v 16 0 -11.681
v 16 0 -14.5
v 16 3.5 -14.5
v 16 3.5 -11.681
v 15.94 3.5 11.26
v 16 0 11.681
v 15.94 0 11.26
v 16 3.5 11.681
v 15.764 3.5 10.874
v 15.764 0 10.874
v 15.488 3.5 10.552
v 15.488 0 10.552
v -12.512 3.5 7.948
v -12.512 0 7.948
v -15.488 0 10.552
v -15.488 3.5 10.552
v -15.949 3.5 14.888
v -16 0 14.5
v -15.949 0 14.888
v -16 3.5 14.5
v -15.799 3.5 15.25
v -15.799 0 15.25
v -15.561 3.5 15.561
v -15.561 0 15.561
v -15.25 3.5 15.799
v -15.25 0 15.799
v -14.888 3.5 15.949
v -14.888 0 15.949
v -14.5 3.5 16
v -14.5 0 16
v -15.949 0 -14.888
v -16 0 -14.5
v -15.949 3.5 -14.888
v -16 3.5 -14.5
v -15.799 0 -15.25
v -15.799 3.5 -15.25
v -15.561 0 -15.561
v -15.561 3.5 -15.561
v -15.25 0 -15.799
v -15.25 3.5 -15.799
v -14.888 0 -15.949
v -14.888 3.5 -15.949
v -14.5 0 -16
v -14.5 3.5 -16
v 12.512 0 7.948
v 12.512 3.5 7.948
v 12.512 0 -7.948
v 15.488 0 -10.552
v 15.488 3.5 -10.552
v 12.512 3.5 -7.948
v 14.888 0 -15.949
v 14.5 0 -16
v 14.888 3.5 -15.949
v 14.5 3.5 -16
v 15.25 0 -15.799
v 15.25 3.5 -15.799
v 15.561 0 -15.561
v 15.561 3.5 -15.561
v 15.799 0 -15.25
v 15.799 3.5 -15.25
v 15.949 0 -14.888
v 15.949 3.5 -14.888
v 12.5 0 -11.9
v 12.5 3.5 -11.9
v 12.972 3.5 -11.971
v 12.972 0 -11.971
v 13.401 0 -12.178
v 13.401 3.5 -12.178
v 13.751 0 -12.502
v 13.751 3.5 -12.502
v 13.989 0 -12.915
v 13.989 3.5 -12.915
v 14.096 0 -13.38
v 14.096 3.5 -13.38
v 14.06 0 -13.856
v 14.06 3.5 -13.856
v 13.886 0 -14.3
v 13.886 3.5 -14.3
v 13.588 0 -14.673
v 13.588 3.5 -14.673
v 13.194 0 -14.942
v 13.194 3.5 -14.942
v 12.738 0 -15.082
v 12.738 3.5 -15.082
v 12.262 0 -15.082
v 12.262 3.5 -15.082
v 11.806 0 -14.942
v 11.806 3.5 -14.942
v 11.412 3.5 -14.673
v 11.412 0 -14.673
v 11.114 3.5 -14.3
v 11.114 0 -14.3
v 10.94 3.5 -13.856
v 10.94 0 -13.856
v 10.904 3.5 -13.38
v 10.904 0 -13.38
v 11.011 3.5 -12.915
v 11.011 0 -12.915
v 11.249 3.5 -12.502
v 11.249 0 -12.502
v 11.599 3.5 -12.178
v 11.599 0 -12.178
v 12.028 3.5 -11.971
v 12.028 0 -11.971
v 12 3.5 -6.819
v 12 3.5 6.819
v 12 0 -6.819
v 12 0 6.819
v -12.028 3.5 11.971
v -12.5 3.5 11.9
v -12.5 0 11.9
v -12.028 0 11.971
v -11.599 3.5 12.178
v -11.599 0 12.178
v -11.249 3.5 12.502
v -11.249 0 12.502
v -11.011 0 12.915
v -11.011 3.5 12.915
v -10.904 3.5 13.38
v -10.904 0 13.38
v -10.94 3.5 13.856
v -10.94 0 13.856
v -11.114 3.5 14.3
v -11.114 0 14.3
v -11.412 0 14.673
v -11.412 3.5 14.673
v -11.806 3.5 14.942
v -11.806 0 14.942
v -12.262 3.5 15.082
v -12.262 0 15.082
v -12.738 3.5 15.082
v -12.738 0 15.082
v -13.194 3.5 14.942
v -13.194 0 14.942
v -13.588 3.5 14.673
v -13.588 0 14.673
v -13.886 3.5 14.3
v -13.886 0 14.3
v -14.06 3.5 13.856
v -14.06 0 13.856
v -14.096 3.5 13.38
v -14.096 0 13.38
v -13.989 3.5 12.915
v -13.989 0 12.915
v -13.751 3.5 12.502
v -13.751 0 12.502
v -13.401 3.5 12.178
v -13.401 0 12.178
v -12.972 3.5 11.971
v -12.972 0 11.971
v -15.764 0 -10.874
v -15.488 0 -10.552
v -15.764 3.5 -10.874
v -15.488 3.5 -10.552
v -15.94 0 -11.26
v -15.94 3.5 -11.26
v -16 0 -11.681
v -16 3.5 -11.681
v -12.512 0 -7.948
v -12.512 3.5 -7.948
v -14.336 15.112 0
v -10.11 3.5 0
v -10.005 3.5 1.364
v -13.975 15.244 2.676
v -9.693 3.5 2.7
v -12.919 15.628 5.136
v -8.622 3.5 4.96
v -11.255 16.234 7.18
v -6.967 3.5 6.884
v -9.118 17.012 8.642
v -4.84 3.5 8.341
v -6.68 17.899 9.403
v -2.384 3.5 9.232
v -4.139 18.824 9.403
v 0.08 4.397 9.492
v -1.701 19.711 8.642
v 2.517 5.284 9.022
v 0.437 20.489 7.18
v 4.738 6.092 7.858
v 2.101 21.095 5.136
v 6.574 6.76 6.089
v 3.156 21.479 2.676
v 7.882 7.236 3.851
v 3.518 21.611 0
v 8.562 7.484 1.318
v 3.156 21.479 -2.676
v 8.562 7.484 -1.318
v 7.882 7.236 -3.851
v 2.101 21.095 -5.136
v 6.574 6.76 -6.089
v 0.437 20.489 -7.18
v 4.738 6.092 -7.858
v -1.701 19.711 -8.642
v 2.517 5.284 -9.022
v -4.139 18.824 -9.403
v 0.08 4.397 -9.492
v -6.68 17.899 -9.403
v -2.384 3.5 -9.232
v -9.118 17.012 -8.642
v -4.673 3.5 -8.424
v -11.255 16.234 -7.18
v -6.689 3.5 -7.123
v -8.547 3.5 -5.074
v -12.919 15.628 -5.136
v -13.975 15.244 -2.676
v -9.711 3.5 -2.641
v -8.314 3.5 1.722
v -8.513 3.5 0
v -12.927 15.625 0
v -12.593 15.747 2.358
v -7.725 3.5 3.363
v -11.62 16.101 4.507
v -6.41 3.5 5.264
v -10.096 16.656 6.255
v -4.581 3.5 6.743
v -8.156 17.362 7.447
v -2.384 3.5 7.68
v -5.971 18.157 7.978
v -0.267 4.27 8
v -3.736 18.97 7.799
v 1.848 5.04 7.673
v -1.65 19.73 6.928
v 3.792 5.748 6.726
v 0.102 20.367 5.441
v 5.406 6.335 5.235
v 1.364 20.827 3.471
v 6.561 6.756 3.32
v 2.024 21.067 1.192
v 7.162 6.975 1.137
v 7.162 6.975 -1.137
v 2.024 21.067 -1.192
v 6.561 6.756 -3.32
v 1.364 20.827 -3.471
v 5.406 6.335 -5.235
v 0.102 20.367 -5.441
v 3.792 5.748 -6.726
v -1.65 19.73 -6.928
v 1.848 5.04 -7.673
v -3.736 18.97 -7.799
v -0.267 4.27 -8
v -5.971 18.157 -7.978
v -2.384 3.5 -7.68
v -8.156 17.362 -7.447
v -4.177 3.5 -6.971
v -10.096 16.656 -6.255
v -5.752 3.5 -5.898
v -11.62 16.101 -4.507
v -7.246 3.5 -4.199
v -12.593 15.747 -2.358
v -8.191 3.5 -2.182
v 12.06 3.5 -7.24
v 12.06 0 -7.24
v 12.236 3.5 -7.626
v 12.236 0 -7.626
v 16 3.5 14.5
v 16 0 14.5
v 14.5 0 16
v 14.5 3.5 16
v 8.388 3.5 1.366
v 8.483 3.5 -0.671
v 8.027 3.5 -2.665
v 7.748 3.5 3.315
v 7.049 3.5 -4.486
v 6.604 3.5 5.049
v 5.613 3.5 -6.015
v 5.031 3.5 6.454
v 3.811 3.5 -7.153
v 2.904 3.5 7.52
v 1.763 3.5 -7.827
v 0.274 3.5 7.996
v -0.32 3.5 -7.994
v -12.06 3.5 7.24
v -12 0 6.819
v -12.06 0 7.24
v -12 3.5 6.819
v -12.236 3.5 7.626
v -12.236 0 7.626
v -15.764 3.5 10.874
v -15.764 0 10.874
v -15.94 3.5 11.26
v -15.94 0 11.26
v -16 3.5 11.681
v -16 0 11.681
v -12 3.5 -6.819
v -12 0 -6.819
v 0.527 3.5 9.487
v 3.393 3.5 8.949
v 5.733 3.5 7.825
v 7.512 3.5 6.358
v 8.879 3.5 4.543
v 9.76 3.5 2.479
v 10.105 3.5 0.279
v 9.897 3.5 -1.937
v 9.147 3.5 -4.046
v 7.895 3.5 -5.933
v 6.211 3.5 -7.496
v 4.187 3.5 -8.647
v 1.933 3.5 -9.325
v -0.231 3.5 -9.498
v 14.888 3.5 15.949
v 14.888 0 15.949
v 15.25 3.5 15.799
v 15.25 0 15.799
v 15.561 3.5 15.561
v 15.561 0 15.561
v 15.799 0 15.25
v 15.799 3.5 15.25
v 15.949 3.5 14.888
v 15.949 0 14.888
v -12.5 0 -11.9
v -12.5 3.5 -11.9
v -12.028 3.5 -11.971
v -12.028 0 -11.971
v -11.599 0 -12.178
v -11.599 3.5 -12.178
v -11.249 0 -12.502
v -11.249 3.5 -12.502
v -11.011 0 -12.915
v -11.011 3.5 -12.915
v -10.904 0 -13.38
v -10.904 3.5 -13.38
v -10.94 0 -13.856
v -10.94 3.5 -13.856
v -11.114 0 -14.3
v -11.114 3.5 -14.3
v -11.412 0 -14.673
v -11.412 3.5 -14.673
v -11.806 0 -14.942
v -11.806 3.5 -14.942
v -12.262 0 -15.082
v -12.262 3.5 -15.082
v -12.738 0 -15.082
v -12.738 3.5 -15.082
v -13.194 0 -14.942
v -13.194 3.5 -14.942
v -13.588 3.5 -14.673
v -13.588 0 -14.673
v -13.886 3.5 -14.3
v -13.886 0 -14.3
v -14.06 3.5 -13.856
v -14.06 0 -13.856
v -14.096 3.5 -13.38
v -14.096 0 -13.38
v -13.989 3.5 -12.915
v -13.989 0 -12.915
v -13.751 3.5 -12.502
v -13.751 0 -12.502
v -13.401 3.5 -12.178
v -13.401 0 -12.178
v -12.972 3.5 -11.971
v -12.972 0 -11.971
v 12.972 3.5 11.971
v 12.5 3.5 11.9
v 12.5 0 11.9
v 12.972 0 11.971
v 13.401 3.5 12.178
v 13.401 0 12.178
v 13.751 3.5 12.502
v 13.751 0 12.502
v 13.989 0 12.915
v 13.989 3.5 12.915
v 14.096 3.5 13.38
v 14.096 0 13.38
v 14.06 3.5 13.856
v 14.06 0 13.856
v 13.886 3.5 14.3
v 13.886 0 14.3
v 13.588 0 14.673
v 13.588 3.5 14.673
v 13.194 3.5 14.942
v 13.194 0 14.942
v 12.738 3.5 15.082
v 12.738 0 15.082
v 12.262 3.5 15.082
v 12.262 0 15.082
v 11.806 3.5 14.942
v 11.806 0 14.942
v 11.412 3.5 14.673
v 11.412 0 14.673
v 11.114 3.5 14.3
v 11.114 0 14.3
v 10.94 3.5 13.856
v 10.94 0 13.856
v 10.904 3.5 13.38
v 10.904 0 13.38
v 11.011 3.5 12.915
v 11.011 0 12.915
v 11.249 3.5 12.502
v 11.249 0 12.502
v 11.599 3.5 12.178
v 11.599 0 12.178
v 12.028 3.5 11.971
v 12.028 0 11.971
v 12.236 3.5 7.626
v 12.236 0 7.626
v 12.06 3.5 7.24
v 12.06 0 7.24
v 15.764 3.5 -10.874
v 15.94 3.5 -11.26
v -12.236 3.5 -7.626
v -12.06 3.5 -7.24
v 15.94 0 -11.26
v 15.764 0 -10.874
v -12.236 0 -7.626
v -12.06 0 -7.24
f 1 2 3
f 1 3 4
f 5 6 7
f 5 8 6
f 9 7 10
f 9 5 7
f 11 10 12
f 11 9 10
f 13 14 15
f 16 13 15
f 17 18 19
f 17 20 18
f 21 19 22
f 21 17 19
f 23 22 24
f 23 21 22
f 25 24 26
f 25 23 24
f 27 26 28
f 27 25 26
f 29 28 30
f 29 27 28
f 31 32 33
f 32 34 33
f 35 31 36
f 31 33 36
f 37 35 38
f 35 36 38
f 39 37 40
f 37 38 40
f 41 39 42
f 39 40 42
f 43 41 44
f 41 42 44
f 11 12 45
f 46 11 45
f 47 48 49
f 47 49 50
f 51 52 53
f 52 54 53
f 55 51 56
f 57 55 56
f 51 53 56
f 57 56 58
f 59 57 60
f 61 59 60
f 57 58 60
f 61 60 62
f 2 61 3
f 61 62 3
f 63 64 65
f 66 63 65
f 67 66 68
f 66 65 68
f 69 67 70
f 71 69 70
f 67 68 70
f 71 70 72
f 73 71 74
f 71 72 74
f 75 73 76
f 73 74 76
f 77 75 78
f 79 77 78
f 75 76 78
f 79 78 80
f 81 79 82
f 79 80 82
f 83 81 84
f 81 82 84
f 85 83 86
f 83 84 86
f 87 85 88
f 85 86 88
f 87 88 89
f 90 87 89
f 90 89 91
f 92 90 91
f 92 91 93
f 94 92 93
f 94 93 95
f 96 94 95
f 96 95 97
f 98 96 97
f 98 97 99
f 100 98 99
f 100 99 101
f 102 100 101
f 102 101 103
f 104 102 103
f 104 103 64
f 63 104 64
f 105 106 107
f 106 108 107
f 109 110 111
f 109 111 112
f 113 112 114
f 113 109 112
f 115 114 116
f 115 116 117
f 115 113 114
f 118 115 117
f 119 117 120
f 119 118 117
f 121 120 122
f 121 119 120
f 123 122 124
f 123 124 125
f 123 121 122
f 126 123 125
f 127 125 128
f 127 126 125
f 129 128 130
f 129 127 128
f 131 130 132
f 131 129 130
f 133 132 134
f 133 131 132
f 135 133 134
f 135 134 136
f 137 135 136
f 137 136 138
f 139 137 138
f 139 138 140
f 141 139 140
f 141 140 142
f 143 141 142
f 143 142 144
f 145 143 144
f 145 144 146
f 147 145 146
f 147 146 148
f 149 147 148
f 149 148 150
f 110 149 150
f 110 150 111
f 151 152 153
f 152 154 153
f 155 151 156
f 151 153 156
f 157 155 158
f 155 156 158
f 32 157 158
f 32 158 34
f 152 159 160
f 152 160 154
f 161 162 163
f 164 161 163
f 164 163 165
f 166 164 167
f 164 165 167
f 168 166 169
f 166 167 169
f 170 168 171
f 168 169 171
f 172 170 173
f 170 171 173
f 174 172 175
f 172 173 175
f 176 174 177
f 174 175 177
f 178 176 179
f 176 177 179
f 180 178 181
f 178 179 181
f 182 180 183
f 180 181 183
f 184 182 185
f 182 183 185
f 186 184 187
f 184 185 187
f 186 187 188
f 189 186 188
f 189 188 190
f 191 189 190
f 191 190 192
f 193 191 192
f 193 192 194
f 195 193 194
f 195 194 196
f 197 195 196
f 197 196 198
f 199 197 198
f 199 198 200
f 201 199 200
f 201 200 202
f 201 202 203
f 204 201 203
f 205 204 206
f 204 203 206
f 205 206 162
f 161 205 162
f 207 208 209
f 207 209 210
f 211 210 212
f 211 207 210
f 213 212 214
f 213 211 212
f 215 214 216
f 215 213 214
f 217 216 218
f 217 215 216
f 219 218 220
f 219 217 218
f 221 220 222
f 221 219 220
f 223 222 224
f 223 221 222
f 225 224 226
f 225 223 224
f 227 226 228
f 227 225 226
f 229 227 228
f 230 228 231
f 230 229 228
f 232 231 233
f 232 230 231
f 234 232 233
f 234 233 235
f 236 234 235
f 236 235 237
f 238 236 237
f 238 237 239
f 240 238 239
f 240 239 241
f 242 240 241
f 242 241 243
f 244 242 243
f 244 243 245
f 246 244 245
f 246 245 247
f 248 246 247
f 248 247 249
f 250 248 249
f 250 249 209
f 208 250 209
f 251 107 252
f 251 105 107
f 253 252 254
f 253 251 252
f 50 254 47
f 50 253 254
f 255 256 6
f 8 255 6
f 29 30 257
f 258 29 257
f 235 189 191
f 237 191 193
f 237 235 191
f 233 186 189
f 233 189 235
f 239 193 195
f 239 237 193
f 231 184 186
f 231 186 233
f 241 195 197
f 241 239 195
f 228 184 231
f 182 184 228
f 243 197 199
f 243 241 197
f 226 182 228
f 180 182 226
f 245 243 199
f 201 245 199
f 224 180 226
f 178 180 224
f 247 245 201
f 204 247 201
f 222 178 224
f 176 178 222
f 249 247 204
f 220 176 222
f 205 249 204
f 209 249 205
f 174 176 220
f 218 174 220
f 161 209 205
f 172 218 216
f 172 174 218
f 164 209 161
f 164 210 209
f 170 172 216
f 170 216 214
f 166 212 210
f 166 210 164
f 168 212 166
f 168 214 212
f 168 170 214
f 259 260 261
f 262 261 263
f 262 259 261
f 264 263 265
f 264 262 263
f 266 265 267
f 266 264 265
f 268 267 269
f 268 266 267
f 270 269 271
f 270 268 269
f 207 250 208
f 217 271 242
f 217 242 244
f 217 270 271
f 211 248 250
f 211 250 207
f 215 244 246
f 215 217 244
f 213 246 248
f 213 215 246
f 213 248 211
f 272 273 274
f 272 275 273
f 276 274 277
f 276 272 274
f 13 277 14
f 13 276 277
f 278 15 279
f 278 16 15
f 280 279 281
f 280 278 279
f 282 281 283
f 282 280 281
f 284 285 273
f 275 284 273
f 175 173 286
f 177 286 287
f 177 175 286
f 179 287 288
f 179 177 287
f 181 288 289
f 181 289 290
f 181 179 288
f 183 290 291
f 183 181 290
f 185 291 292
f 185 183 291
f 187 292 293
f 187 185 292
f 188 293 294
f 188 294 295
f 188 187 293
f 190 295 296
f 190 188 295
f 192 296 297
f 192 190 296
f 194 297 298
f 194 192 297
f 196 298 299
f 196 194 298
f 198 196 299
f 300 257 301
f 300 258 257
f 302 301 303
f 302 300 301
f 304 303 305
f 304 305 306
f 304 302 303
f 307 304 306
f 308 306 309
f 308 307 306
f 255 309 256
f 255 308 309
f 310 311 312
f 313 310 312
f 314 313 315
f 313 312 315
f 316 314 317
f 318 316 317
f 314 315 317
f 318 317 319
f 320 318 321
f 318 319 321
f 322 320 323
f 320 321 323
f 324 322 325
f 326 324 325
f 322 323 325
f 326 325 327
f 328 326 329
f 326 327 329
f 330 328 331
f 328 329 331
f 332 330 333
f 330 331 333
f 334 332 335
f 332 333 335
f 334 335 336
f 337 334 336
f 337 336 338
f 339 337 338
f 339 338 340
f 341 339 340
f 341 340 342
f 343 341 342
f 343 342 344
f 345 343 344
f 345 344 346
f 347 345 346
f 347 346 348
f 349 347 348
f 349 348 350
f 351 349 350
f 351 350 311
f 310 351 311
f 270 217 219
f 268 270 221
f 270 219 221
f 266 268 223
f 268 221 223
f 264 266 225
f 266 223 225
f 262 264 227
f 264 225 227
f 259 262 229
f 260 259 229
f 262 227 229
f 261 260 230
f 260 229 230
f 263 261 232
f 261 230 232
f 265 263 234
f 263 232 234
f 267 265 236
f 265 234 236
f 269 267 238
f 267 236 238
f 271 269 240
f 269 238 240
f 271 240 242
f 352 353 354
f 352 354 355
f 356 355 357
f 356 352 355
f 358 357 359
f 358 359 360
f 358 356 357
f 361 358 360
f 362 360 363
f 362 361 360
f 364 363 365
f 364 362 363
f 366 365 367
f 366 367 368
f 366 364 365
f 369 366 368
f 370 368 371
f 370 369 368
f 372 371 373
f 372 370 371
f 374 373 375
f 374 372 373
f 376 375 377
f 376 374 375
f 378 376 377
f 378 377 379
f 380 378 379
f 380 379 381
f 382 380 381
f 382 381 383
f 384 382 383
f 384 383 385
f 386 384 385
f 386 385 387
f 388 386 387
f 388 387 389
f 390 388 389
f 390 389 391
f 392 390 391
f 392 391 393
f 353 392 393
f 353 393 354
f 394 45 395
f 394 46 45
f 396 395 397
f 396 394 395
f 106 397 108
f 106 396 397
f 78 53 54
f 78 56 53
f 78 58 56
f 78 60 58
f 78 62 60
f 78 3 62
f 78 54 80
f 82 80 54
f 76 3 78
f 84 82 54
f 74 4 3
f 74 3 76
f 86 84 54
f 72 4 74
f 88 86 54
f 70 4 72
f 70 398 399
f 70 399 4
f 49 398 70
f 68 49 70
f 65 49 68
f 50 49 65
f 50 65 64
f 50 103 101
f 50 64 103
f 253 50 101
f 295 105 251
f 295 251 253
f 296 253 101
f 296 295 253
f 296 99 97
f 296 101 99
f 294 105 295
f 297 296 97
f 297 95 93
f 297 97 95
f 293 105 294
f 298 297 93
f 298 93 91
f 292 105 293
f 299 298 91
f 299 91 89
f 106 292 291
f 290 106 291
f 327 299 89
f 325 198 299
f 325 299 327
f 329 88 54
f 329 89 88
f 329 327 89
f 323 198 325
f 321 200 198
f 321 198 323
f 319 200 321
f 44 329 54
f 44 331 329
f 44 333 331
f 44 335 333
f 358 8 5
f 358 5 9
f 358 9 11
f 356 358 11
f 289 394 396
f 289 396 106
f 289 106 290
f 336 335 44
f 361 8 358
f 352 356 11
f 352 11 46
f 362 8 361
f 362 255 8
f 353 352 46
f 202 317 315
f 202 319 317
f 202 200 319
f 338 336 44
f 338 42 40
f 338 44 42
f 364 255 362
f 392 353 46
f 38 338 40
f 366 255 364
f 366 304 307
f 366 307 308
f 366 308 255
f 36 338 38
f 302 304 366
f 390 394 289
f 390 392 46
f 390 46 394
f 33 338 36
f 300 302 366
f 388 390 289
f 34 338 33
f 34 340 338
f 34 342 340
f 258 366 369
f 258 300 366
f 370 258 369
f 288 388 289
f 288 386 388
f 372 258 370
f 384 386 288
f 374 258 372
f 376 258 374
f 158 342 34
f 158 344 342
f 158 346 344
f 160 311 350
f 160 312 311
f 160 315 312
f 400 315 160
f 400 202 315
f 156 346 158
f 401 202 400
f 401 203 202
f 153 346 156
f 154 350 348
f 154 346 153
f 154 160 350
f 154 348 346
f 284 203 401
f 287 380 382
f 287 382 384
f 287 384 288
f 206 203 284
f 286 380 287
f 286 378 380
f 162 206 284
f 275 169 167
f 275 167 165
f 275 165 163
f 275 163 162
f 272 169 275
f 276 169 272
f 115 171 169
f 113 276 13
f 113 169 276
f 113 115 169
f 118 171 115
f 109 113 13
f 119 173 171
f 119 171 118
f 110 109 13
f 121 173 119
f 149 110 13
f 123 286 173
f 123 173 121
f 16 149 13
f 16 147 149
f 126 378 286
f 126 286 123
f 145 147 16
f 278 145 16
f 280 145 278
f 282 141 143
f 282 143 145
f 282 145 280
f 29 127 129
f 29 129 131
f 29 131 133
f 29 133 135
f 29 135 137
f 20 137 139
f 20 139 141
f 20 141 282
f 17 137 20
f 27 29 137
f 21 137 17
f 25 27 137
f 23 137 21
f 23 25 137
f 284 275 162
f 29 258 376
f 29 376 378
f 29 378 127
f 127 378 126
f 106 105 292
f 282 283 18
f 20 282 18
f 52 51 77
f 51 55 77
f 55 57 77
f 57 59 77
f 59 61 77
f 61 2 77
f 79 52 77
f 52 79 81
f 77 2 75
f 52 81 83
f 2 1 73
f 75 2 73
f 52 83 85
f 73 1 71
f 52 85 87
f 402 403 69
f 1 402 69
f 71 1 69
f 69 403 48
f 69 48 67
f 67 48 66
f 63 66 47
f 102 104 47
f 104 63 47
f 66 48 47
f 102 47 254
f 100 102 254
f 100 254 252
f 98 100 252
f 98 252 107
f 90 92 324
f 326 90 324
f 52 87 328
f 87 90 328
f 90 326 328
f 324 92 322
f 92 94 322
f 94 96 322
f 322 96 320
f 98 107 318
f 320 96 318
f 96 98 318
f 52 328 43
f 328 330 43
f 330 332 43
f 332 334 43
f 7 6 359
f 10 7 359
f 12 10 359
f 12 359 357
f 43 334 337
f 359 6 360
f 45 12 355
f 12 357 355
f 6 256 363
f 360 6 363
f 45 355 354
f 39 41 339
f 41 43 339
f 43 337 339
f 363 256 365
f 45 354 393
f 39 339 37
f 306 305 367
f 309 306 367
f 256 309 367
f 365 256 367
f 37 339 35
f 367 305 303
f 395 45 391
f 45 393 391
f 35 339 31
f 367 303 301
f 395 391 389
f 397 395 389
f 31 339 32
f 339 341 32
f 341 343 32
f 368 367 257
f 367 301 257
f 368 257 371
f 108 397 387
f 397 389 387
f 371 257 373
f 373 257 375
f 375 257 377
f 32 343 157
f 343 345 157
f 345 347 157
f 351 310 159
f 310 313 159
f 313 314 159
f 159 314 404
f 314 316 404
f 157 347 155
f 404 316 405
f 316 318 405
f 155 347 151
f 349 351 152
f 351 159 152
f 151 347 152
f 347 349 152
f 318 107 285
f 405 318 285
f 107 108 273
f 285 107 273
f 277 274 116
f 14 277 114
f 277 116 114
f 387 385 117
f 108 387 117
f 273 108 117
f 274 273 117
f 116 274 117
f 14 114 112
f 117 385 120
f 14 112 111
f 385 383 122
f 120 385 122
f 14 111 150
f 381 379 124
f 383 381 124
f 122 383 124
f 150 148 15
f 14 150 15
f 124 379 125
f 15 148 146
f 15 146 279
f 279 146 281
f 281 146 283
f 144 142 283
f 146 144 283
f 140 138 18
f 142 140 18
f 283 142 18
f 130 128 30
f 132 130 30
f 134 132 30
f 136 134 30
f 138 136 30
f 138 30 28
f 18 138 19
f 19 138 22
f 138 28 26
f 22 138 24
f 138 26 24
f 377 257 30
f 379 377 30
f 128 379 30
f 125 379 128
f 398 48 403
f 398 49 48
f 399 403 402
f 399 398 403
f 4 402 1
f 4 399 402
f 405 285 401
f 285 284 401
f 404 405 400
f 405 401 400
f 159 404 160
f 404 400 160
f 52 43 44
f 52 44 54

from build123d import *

# Parameters (mm, degrees)
BOSS_EXTRUDE1_DEPTH             = 3.5
CUT_EXTRUDE1_REACH              = 24.897
SKETCH2_R                       = 1.6
FILLET1_R                       = 1.5
FILLET1_OF_MIRROR1_R            = 1.5
SKETCH3_R                       = 9.5
SKETCH3_R_2                     = 8
BOSS_EXTRUDE3_DEPTH             = 15
BOSS_EXTRUDE3_DIRECTION_2_REACH = 25.953


with BuildPart() as part:
    # Sketch1 → Boss-Extrude1 (new body)
    with BuildSketch(Plane(origin=(0, 0, 0), x_dir=(1, 0, 0), z_dir=(0, 1, 0))):
        Polygon((-12, 0), (-12, 7.5), (-16, 11), (-16, 16), (16, 16), (16, 11), (12, 7.5), (12, 0), align=None)
    boss_extrude1 = extrude(amount=BOSS_EXTRUDE1_DEPTH)

    # Sketch2 → Cut-Extrude1 (cut, up to next)
    with BuildSketch(Plane(origin=(0, 3.5, 0), x_dir=(1, 0, 0), z_dir=(0, 1, 0)), mode=Mode.PRIVATE) as cut_extrude1_sk1:
        with Locations(Location((-12.5, 13.5, 0), (0, 0, 270))):
            Circle(SKETCH2_R)
    cut_extrude1_tool1 = extrude(cut_extrude1_sk1.sketch, amount=-CUT_EXTRUDE1_REACH, mode=Mode.PRIVATE) & part.part
    # Sketch2 → Cut-Extrude1 (cut, up to next)
    with BuildSketch(Plane(origin=(0, 3.5, 0), x_dir=(1, 0, 0), z_dir=(0, 1, 0)), mode=Mode.PRIVATE) as cut_extrude1_sk2:
        with Locations(Location((12.5, 13.5, 0), (0, 0, 270))):
            Circle(SKETCH2_R)
    cut_extrude1_tool2 = extrude(cut_extrude1_sk2.sketch, amount=-CUT_EXTRUDE1_REACH, mode=Mode.PRIVATE) & part.part
    cut_extrude1_1 = cut_extrude1_tool1.solids().sort_by_distance((-12.5, 3.5, -13.5))[0]
    add(cut_extrude1_1, mode=Mode.SUBTRACT)
    cut_extrude1_2 = cut_extrude1_tool2.solids().sort_by_distance((12.5, 3.5, -13.5))[0]
    add(cut_extrude1_2, mode=Mode.SUBTRACT)
    cut_extrude1 = cut_extrude1_1 + cut_extrude1_2  # Cut-Extrude1 as one shape, for the pattern or mirror that repeats it

    # Fillet1
    fillet1_edges = [part.edges().sort_by_distance(p)[0] for p in [
        (-12, 1.75, -7.5),
        (-16, 1.75, -11),
        (-16, 1.75, -16),
        (16, 1.75, -16),
        (16, 1.75, -11),
        (12, 1.75, -7.5),
    ]]
    fillet(fillet1_edges, radius=FILLET1_R)

    # Mirror1: Boss-Extrude1, Cut-Extrude1 across plane
    add(boss_extrude1.mirror(Plane.XY))
    add(cut_extrude1.mirror(Plane.XY), mode=Mode.SUBTRACT)

    # Fillet1 of Mirror1
    fillet1_of_mirror1_edges = [part.edges().sort_by_distance(p)[0] for p in [
        (-12, 1.75, 7.5),
        (-16, 1.75, 11),
        (-16, 1.75, 16),
        (16, 1.75, 16),
        (16, 1.75, 11),
        (12, 1.75, 7.5),
    ]]
    fillet(fillet1_of_mirror1_edges, radius=FILLET1_OF_MIRROR1_R)

    # Sketch3 → Boss-Extrude3 (add)
    with BuildSketch(Plane(origin=(-1.403733341, 3.856725658, 0), x_dir=(0, 0, 1), z_dir=(-0.34202014332566977, 0.939692620785908, 0))):
        with Locations(Location((0, 1.197070502, 0), (0, 0, 270))):
            Circle(SKETCH3_R)
        with Locations(Location((0, 1.197070502, 0), (0, 0, 270))):
            Circle(SKETCH3_R_2, mode=Mode.SUBTRACT)
    extrude(amount=BOSS_EXTRUDE3_DEPTH)

    # Boss-Extrude3 direction 2: up to this face of the body (flat: up to its plane)
    boss_extrude3_direction_2_end = Plane(part.part.faces().sort_by_distance((0, 3.5, 0))[0])
    # Sketch3 → Boss-Extrude3 direction 2 (add, up to the picked face)
    with BuildSketch(Plane(origin=(-1.403733341, 3.856725658, 0), x_dir=(0, 0, 1), z_dir=(-0.34202014332566977, 0.939692620785908, 0)), mode=Mode.PRIVATE) as boss_extrude3_direction_2_sk1:
        with Locations(Location((0, 1.197070502, 0), (0, 0, 270))):
            Circle(SKETCH3_R)
        with Locations(Location((0, 1.197070502, 0), (0, 0, 270))):
            Circle(SKETCH3_R_2, mode=Mode.SUBTRACT)
    boss_extrude3_direction_2_tool1 = split(extrude(boss_extrude3_direction_2_sk1.sketch, amount=-BOSS_EXTRUDE3_DIRECTION_2_REACH, mode=Mode.PRIVATE), bisect_by=boss_extrude3_direction_2_end, keep=Keep.BOTH, mode=Mode.PRIVATE)
    add(boss_extrude3_direction_2_tool1.solids().sort_by(Axis((8.395729, 7.423438, 0), (0.34202014332566977, -0.939692620785908, 0)))[0])


solid = part.part
